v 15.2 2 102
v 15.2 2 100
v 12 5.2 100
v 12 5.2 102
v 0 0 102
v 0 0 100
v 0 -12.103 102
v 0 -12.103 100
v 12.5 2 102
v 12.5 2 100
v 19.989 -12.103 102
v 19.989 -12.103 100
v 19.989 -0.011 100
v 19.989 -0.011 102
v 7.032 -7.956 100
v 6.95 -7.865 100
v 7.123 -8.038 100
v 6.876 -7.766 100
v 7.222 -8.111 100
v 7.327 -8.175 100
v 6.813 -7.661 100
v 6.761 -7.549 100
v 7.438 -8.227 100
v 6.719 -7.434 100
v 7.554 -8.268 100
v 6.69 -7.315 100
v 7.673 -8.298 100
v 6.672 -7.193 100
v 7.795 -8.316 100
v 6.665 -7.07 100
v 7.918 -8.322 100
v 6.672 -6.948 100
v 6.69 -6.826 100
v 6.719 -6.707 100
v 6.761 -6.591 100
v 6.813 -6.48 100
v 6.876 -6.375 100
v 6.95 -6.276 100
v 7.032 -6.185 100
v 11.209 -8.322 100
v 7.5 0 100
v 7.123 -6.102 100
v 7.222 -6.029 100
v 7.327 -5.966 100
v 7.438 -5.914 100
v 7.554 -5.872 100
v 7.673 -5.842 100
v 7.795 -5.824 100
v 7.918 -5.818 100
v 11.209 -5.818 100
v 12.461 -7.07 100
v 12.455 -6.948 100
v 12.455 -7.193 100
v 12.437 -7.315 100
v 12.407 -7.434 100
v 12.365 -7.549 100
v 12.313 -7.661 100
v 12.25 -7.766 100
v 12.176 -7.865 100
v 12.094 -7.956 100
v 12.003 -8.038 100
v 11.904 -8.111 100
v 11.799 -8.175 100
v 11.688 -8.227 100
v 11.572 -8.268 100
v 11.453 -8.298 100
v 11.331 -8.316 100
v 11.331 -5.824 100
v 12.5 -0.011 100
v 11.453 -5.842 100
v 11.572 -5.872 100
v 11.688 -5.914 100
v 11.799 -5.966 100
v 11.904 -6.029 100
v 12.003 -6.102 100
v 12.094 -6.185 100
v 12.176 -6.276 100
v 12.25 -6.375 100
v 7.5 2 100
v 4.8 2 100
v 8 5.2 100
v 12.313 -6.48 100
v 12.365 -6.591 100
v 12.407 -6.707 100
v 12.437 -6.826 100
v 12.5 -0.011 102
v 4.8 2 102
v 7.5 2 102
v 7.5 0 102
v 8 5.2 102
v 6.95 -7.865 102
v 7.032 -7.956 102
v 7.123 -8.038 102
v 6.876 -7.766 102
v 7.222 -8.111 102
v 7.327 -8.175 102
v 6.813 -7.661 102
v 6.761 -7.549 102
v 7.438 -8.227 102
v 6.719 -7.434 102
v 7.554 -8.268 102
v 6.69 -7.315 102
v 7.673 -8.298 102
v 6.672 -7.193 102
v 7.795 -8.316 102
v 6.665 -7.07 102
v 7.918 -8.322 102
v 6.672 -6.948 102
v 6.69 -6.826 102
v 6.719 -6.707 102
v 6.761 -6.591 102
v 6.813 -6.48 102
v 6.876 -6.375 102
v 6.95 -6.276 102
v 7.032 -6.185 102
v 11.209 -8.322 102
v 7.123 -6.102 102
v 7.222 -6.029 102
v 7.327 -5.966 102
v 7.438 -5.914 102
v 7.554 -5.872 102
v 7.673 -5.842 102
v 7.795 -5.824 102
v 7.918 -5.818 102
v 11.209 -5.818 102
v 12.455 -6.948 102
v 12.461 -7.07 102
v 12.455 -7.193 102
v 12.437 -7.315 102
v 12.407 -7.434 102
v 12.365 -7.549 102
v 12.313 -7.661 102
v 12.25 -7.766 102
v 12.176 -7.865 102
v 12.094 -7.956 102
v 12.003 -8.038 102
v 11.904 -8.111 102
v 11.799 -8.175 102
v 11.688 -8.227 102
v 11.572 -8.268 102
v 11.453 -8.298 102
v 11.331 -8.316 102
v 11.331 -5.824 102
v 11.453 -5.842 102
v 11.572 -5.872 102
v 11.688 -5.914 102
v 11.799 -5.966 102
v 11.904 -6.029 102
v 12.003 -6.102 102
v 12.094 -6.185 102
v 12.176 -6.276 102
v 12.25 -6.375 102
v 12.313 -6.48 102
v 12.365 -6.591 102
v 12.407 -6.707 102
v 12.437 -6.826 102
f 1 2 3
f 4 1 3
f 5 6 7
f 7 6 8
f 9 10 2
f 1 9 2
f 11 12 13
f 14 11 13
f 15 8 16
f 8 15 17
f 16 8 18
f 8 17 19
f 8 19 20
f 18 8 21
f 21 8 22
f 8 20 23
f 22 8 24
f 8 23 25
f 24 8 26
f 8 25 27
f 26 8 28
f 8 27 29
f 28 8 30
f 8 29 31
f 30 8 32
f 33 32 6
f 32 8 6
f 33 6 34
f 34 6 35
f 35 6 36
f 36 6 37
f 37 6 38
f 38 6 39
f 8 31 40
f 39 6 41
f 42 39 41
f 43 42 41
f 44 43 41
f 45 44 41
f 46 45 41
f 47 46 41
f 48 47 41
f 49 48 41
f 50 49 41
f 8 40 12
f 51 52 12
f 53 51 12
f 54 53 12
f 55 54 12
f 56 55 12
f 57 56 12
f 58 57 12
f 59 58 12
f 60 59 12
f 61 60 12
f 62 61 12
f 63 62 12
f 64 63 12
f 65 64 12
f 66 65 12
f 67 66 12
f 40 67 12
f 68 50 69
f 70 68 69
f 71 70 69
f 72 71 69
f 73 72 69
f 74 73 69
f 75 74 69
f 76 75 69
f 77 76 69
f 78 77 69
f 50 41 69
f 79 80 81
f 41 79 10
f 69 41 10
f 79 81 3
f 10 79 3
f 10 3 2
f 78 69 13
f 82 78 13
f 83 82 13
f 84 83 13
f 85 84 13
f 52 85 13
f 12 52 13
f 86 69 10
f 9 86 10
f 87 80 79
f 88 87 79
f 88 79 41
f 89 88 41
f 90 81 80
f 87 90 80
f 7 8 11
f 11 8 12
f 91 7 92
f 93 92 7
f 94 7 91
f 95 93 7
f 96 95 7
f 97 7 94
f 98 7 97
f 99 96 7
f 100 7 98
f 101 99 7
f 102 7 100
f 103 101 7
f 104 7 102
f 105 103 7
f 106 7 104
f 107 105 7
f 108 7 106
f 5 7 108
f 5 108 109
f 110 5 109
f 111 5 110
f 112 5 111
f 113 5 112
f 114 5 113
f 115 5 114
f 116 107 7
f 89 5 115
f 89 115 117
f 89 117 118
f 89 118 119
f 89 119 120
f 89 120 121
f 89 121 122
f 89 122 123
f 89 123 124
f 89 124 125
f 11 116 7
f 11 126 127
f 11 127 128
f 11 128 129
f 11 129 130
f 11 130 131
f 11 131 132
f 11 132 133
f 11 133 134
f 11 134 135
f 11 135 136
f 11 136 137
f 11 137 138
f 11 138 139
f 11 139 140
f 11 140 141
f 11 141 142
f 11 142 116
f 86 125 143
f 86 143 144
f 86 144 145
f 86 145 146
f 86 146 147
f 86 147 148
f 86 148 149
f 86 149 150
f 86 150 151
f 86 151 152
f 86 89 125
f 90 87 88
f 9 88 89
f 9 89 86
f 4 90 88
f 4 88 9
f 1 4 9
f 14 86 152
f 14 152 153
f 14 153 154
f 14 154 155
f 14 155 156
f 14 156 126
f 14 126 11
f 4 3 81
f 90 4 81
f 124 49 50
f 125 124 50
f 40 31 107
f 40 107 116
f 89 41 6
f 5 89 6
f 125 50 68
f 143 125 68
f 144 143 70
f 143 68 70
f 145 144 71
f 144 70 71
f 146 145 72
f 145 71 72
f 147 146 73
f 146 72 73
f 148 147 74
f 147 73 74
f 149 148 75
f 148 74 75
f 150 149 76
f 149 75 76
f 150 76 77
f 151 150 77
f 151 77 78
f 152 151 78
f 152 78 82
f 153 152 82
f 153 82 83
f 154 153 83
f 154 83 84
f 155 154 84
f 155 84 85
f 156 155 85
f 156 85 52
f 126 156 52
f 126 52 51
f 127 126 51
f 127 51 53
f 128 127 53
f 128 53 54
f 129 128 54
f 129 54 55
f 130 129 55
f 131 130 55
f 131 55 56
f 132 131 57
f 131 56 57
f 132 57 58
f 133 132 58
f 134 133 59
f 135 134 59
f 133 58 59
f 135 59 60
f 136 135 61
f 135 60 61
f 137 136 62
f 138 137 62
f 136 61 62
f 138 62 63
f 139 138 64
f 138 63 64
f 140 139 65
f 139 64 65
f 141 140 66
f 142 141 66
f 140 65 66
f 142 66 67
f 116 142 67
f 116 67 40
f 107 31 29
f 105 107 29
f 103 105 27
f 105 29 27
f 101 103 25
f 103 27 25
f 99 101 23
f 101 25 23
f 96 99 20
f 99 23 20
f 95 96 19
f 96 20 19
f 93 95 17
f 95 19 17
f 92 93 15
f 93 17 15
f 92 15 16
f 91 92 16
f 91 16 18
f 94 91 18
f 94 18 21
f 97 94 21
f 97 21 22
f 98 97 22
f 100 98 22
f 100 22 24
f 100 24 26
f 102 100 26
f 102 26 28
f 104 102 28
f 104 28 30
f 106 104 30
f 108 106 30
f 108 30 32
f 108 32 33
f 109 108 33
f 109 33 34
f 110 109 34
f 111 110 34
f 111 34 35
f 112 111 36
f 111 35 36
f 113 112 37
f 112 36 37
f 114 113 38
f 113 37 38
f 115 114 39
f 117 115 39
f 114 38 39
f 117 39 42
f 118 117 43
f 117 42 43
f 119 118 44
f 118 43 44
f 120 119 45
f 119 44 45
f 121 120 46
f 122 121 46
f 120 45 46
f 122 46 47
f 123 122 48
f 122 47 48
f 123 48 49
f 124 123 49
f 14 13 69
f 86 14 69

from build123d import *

# Parameters (mm, degrees)
PAD_DEPTH    = 2
POCKET_DEPTH = 5


with BuildPart() as part:
    # Sketch003 → Pad (new body)
    with BuildSketch(Plane.XY.offset(100)):
        Polygon((19.988775, -0.010854), (12.5, -0.010854), (12.5, 2), (15.2, 2), (12, 5.2), (8, 5.2), (4.8, 2), (7.5, 2), (7.5, 0), (0, 0), (0, -12.103219), (19.988775, -12.103219), align=None)
    extrude(amount=PAD_DEPTH)

    # Sketch (on Face13 of Pad) → Pocket (cut)
    with BuildSketch(Plane(origin=(0, 0, 100), x_dir=(1, 0, 0), z_dir=(0, 0, -1))):
        with BuildLine():
            ThreePointArc((7.917523, 8.322382), (6.665478, 7.070337), (7.917523, 5.818292))
            Line((7.917523, 5.818292), (11.208614, 5.818292))
            ThreePointArc((11.208614, 5.818292), (12.460659, 7.070337), (11.208614, 8.322382))
            Line((7.917523, 8.322382), (11.208614, 8.322382))
        make_face()
    extrude(amount=-POCKET_DEPTH, mode=Mode.SUBTRACT)


solid = part.part
